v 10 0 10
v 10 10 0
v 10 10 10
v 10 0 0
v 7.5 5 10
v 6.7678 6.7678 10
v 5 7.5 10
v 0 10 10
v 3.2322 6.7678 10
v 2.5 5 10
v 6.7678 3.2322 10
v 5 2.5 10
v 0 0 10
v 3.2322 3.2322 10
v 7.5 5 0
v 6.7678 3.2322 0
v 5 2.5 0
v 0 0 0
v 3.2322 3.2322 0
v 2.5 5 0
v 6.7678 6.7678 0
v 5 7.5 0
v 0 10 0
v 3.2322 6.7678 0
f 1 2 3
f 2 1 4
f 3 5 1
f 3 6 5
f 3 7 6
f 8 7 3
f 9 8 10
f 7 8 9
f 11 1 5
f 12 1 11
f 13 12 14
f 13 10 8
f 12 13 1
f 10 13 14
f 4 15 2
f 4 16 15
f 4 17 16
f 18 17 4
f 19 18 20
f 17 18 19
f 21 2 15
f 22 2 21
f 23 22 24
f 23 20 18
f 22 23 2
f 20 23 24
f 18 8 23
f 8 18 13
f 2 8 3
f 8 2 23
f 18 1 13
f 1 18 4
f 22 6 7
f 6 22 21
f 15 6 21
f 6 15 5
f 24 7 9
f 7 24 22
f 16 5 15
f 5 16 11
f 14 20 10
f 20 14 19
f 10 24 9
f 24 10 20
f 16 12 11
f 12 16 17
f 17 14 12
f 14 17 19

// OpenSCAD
// The exact-geometry audit's case b03 (docs/audits/exact-geometry-rust.md).
// volume: 803.650459150638
difference() { cube(10); translate([5,5,-1]) cylinder(r=2.5, h=12); }
